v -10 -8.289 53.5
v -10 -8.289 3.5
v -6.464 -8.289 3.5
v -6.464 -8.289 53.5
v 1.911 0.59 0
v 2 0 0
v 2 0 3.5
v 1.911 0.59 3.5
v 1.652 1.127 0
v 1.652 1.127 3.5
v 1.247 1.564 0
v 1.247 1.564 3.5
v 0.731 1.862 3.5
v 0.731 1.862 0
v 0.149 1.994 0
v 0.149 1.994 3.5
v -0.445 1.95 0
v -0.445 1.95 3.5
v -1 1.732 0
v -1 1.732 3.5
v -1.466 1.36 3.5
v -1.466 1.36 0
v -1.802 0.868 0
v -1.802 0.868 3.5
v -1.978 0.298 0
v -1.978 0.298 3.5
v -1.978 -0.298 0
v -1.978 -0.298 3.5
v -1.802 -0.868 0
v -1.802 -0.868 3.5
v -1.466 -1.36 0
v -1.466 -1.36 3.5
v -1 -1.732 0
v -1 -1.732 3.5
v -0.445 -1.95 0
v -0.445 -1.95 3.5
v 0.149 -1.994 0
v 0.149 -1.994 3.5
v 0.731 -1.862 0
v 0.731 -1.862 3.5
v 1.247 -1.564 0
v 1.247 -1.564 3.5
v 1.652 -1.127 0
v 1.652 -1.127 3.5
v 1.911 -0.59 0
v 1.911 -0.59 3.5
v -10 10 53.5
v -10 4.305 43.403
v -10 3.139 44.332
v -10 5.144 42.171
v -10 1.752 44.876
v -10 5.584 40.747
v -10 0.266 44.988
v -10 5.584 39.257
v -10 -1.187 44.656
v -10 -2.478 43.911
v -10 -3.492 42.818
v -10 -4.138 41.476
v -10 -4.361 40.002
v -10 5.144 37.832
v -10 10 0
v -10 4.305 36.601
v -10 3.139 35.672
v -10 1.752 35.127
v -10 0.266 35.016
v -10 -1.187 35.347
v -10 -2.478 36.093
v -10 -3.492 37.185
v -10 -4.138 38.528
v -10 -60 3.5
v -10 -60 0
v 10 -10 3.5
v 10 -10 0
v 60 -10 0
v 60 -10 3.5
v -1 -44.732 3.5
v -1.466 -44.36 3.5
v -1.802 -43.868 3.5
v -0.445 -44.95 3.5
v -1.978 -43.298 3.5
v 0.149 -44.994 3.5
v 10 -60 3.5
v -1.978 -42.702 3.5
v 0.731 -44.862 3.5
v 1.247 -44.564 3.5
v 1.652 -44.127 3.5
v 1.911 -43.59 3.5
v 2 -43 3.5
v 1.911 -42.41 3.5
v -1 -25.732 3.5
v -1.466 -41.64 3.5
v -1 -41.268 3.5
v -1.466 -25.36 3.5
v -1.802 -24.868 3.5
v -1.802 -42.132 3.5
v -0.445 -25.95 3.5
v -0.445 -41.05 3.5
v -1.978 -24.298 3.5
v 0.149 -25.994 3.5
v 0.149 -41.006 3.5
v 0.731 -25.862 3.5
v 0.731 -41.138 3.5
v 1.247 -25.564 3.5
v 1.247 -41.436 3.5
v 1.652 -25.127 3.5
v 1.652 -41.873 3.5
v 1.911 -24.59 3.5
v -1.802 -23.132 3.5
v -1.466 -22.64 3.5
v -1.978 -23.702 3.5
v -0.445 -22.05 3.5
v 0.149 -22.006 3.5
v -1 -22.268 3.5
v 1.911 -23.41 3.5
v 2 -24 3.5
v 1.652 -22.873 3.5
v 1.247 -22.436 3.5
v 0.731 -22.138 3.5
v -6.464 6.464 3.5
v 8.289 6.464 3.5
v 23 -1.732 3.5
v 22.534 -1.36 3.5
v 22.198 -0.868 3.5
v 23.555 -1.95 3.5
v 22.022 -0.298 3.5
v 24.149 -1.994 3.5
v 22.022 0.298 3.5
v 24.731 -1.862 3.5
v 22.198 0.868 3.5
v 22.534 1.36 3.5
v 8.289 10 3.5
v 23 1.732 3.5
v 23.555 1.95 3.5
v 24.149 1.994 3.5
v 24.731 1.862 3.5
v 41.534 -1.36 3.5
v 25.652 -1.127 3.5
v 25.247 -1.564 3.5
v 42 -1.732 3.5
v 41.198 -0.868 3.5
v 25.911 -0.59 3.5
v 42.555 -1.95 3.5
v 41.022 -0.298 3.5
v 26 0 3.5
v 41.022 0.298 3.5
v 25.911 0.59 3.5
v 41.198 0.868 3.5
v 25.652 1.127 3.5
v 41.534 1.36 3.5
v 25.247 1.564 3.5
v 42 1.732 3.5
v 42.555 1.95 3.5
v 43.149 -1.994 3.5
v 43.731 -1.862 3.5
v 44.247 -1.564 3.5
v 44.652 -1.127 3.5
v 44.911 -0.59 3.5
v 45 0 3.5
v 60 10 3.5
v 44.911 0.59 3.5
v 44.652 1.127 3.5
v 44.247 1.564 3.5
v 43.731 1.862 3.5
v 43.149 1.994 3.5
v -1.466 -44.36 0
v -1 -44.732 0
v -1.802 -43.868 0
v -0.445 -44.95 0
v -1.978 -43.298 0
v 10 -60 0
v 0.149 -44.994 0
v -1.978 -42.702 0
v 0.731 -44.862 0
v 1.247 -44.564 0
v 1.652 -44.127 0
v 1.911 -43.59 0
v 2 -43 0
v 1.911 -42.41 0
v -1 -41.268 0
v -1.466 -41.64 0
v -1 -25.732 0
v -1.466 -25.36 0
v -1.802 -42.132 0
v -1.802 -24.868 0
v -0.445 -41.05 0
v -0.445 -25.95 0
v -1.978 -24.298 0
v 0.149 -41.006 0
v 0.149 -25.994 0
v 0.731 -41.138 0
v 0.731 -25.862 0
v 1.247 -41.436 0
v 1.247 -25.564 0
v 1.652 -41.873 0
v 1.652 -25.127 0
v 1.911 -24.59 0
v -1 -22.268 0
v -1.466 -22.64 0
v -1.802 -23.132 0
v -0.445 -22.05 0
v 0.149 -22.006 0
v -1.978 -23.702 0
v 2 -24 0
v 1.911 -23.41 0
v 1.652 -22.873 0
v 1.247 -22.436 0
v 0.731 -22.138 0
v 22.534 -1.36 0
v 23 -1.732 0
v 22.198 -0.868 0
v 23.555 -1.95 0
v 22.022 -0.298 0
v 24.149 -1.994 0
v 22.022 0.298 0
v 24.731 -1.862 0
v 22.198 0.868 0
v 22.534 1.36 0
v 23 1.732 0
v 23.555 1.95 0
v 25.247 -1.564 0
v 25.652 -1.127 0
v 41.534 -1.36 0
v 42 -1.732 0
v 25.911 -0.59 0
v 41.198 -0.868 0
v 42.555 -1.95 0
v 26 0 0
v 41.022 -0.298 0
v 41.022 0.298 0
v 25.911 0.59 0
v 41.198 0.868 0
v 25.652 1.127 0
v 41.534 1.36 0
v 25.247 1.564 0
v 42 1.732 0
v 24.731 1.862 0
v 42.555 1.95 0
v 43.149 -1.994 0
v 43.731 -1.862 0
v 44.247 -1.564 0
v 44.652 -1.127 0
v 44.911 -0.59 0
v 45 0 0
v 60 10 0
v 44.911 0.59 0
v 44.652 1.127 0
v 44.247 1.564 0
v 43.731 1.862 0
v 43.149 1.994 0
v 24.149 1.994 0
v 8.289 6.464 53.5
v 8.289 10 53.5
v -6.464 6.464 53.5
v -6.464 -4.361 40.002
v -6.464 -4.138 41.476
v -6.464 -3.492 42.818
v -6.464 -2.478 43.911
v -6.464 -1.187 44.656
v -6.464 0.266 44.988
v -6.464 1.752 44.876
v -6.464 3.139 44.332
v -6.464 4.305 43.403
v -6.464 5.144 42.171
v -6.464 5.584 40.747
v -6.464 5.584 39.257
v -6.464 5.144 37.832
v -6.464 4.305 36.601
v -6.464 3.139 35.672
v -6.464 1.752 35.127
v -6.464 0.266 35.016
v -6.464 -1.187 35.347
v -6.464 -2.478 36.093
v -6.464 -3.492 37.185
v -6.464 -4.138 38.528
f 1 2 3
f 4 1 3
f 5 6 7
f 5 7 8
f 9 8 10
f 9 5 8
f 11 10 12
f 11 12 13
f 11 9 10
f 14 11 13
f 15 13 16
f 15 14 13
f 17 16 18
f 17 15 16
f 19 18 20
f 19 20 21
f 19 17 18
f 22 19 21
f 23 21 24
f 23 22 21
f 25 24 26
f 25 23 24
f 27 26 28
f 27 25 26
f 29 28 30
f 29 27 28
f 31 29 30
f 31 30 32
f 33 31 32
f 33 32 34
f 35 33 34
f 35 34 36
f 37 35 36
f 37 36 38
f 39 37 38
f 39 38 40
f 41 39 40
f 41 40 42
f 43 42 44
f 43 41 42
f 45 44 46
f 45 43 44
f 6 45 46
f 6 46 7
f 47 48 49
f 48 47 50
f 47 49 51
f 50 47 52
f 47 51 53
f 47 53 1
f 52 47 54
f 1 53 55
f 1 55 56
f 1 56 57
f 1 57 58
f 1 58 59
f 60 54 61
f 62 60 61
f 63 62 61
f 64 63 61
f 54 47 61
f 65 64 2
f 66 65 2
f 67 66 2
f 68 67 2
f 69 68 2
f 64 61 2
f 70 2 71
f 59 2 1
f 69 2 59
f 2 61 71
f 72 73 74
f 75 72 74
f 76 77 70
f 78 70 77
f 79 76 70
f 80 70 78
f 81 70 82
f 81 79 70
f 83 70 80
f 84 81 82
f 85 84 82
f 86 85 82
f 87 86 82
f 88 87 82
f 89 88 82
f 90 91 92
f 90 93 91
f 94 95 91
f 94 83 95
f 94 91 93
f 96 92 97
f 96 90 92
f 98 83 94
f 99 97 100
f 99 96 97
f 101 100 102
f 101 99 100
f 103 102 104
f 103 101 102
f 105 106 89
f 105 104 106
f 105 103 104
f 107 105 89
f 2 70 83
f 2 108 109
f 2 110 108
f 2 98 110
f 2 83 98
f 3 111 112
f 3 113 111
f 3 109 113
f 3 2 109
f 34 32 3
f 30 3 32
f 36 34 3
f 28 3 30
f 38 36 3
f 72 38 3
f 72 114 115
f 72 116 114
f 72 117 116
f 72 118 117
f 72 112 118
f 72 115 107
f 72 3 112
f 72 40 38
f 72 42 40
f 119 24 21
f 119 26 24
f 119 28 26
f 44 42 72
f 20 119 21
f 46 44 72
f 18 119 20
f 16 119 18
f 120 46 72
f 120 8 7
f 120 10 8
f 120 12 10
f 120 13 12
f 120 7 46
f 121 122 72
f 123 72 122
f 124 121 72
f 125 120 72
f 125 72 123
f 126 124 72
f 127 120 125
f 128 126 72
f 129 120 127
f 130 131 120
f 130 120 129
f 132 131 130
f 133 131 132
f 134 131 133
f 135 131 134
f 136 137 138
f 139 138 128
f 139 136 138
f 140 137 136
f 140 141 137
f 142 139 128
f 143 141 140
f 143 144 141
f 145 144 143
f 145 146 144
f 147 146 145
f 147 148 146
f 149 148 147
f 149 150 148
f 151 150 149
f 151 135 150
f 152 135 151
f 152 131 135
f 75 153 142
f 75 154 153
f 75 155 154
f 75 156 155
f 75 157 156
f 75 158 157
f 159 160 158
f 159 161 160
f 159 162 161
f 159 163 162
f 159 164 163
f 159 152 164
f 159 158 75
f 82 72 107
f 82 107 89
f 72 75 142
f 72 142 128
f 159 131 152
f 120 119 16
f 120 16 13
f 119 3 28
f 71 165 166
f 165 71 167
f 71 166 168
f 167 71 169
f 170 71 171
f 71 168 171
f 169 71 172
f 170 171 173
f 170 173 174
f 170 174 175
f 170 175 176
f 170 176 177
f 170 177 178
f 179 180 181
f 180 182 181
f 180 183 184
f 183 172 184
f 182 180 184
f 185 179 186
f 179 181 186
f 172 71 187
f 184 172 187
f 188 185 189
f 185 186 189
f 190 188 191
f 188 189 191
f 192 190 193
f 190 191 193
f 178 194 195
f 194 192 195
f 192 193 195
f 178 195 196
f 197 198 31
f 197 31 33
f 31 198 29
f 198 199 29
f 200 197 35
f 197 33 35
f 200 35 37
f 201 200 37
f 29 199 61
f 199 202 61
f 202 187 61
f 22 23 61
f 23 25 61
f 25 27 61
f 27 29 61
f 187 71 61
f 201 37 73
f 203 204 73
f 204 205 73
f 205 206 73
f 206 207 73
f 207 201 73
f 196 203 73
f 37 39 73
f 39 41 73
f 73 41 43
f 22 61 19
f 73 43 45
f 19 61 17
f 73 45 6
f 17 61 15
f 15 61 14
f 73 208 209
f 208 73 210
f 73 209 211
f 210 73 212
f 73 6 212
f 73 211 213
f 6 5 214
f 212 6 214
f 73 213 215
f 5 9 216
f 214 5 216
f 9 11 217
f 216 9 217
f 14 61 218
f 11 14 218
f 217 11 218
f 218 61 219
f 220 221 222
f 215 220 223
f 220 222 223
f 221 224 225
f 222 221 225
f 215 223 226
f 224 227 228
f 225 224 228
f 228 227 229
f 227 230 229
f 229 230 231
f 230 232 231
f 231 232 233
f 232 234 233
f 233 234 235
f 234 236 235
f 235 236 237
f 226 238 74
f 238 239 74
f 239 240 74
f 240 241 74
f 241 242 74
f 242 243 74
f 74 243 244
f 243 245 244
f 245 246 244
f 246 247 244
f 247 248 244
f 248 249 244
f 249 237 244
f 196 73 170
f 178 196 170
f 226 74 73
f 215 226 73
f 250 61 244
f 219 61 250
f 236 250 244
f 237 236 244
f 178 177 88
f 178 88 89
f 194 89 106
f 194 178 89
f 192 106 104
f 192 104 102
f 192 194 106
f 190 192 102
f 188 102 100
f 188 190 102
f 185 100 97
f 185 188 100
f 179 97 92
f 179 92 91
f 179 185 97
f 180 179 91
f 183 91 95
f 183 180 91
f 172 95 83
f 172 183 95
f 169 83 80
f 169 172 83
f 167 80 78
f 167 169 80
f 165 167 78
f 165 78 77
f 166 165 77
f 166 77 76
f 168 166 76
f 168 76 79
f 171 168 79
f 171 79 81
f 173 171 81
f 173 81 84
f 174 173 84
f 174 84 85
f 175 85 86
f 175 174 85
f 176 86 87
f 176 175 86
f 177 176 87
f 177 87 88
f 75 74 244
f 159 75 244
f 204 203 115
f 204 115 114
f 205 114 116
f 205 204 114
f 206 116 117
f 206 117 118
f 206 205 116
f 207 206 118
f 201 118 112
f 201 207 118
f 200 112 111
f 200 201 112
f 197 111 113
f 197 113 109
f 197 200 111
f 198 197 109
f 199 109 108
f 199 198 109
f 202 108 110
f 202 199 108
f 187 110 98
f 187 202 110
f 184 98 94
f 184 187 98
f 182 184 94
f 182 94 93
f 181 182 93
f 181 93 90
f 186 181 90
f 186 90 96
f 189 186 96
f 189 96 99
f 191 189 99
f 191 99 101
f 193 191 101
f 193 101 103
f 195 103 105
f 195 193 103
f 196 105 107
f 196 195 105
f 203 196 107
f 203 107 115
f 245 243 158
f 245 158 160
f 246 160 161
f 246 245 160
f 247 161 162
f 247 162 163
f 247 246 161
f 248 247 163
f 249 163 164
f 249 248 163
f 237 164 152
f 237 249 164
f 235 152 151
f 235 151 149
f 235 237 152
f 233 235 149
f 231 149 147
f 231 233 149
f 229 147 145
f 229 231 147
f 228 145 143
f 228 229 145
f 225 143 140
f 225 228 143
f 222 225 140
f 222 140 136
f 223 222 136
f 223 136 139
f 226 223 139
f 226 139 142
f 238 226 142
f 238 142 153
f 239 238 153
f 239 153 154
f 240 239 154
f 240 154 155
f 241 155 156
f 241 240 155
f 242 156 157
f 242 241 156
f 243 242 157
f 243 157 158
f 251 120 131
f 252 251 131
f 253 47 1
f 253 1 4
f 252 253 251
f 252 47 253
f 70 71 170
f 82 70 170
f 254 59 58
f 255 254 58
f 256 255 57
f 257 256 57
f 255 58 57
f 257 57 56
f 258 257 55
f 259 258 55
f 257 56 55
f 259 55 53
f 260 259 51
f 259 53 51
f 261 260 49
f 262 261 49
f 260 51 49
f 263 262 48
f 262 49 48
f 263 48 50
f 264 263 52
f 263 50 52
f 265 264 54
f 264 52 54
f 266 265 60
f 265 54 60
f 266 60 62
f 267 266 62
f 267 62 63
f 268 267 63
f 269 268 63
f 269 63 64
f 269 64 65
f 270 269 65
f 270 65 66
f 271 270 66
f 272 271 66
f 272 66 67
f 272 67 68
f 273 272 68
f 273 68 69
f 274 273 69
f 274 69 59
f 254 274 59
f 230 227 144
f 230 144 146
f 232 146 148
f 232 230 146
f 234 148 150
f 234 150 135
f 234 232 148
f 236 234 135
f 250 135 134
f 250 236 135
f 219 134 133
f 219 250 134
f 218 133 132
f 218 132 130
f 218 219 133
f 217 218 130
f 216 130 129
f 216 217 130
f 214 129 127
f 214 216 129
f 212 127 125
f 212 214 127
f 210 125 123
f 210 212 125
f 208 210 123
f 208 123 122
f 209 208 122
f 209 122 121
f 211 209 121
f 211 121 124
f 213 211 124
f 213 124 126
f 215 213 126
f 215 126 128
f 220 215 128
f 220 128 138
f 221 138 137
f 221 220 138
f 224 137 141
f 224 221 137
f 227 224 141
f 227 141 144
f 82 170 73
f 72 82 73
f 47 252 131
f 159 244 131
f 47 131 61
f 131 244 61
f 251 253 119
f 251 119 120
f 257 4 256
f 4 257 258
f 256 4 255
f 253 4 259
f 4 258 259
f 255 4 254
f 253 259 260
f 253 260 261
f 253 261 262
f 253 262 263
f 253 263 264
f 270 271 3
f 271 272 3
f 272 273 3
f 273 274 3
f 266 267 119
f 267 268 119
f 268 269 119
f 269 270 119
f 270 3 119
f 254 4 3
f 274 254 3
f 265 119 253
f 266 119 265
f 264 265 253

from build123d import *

# Parameters (mm, degrees)
F0_R     = 2
F1_DEPTH = 3.5
F3_DEPTH = 50
F4_R     = 5
F5_DEPTH = 70.001


with BuildPart() as f1:
    # F0 (on Top) → F1 (new body)
    with BuildSketch(Plane.XY):
        Polygon((-10, -10), (-10, -60), (10, -60), (10, -10), (60, -10), (60, 10), (10, 10), (-10, 10), align=None)
        with Locations((0, -43)):
            Circle(F0_R, mode=Mode.SUBTRACT)
        with Locations((0, -24)):
            Circle(F0_R, mode=Mode.SUBTRACT)
        Circle(F0_R, mode=Mode.SUBTRACT)
        with Locations((24, 0)):
            Circle(F0_R, mode=Mode.SUBTRACT)
        with Locations((43, 0)):
            Circle(F0_R, mode=Mode.SUBTRACT)
    extrude(amount=F1_DEPTH)

    # F2 (on face) → F3 (join)
    with BuildSketch(Plane.XY.offset(3.5)):
        Polygon((8.289474, 10), (-10, 10), (-10, -8.289474), (-6.464466, -8.289474), (-6.464466, 6.464466), (8.289474, 6.464466), align=None)
    extrude(amount=F3_DEPTH)

    # F4 (on face) → F5 (cut, through all)
    with BuildSketch(Plane(origin=(-10, 0, 0), x_dir=(0, -1, 0), z_dir=(-1, 0, 0))):
        with Locations((-0.639477, 40.001725)):
            Circle(F4_R)
    extrude(amount=-F5_DEPTH, mode=Mode.SUBTRACT)


solid = f1.part
